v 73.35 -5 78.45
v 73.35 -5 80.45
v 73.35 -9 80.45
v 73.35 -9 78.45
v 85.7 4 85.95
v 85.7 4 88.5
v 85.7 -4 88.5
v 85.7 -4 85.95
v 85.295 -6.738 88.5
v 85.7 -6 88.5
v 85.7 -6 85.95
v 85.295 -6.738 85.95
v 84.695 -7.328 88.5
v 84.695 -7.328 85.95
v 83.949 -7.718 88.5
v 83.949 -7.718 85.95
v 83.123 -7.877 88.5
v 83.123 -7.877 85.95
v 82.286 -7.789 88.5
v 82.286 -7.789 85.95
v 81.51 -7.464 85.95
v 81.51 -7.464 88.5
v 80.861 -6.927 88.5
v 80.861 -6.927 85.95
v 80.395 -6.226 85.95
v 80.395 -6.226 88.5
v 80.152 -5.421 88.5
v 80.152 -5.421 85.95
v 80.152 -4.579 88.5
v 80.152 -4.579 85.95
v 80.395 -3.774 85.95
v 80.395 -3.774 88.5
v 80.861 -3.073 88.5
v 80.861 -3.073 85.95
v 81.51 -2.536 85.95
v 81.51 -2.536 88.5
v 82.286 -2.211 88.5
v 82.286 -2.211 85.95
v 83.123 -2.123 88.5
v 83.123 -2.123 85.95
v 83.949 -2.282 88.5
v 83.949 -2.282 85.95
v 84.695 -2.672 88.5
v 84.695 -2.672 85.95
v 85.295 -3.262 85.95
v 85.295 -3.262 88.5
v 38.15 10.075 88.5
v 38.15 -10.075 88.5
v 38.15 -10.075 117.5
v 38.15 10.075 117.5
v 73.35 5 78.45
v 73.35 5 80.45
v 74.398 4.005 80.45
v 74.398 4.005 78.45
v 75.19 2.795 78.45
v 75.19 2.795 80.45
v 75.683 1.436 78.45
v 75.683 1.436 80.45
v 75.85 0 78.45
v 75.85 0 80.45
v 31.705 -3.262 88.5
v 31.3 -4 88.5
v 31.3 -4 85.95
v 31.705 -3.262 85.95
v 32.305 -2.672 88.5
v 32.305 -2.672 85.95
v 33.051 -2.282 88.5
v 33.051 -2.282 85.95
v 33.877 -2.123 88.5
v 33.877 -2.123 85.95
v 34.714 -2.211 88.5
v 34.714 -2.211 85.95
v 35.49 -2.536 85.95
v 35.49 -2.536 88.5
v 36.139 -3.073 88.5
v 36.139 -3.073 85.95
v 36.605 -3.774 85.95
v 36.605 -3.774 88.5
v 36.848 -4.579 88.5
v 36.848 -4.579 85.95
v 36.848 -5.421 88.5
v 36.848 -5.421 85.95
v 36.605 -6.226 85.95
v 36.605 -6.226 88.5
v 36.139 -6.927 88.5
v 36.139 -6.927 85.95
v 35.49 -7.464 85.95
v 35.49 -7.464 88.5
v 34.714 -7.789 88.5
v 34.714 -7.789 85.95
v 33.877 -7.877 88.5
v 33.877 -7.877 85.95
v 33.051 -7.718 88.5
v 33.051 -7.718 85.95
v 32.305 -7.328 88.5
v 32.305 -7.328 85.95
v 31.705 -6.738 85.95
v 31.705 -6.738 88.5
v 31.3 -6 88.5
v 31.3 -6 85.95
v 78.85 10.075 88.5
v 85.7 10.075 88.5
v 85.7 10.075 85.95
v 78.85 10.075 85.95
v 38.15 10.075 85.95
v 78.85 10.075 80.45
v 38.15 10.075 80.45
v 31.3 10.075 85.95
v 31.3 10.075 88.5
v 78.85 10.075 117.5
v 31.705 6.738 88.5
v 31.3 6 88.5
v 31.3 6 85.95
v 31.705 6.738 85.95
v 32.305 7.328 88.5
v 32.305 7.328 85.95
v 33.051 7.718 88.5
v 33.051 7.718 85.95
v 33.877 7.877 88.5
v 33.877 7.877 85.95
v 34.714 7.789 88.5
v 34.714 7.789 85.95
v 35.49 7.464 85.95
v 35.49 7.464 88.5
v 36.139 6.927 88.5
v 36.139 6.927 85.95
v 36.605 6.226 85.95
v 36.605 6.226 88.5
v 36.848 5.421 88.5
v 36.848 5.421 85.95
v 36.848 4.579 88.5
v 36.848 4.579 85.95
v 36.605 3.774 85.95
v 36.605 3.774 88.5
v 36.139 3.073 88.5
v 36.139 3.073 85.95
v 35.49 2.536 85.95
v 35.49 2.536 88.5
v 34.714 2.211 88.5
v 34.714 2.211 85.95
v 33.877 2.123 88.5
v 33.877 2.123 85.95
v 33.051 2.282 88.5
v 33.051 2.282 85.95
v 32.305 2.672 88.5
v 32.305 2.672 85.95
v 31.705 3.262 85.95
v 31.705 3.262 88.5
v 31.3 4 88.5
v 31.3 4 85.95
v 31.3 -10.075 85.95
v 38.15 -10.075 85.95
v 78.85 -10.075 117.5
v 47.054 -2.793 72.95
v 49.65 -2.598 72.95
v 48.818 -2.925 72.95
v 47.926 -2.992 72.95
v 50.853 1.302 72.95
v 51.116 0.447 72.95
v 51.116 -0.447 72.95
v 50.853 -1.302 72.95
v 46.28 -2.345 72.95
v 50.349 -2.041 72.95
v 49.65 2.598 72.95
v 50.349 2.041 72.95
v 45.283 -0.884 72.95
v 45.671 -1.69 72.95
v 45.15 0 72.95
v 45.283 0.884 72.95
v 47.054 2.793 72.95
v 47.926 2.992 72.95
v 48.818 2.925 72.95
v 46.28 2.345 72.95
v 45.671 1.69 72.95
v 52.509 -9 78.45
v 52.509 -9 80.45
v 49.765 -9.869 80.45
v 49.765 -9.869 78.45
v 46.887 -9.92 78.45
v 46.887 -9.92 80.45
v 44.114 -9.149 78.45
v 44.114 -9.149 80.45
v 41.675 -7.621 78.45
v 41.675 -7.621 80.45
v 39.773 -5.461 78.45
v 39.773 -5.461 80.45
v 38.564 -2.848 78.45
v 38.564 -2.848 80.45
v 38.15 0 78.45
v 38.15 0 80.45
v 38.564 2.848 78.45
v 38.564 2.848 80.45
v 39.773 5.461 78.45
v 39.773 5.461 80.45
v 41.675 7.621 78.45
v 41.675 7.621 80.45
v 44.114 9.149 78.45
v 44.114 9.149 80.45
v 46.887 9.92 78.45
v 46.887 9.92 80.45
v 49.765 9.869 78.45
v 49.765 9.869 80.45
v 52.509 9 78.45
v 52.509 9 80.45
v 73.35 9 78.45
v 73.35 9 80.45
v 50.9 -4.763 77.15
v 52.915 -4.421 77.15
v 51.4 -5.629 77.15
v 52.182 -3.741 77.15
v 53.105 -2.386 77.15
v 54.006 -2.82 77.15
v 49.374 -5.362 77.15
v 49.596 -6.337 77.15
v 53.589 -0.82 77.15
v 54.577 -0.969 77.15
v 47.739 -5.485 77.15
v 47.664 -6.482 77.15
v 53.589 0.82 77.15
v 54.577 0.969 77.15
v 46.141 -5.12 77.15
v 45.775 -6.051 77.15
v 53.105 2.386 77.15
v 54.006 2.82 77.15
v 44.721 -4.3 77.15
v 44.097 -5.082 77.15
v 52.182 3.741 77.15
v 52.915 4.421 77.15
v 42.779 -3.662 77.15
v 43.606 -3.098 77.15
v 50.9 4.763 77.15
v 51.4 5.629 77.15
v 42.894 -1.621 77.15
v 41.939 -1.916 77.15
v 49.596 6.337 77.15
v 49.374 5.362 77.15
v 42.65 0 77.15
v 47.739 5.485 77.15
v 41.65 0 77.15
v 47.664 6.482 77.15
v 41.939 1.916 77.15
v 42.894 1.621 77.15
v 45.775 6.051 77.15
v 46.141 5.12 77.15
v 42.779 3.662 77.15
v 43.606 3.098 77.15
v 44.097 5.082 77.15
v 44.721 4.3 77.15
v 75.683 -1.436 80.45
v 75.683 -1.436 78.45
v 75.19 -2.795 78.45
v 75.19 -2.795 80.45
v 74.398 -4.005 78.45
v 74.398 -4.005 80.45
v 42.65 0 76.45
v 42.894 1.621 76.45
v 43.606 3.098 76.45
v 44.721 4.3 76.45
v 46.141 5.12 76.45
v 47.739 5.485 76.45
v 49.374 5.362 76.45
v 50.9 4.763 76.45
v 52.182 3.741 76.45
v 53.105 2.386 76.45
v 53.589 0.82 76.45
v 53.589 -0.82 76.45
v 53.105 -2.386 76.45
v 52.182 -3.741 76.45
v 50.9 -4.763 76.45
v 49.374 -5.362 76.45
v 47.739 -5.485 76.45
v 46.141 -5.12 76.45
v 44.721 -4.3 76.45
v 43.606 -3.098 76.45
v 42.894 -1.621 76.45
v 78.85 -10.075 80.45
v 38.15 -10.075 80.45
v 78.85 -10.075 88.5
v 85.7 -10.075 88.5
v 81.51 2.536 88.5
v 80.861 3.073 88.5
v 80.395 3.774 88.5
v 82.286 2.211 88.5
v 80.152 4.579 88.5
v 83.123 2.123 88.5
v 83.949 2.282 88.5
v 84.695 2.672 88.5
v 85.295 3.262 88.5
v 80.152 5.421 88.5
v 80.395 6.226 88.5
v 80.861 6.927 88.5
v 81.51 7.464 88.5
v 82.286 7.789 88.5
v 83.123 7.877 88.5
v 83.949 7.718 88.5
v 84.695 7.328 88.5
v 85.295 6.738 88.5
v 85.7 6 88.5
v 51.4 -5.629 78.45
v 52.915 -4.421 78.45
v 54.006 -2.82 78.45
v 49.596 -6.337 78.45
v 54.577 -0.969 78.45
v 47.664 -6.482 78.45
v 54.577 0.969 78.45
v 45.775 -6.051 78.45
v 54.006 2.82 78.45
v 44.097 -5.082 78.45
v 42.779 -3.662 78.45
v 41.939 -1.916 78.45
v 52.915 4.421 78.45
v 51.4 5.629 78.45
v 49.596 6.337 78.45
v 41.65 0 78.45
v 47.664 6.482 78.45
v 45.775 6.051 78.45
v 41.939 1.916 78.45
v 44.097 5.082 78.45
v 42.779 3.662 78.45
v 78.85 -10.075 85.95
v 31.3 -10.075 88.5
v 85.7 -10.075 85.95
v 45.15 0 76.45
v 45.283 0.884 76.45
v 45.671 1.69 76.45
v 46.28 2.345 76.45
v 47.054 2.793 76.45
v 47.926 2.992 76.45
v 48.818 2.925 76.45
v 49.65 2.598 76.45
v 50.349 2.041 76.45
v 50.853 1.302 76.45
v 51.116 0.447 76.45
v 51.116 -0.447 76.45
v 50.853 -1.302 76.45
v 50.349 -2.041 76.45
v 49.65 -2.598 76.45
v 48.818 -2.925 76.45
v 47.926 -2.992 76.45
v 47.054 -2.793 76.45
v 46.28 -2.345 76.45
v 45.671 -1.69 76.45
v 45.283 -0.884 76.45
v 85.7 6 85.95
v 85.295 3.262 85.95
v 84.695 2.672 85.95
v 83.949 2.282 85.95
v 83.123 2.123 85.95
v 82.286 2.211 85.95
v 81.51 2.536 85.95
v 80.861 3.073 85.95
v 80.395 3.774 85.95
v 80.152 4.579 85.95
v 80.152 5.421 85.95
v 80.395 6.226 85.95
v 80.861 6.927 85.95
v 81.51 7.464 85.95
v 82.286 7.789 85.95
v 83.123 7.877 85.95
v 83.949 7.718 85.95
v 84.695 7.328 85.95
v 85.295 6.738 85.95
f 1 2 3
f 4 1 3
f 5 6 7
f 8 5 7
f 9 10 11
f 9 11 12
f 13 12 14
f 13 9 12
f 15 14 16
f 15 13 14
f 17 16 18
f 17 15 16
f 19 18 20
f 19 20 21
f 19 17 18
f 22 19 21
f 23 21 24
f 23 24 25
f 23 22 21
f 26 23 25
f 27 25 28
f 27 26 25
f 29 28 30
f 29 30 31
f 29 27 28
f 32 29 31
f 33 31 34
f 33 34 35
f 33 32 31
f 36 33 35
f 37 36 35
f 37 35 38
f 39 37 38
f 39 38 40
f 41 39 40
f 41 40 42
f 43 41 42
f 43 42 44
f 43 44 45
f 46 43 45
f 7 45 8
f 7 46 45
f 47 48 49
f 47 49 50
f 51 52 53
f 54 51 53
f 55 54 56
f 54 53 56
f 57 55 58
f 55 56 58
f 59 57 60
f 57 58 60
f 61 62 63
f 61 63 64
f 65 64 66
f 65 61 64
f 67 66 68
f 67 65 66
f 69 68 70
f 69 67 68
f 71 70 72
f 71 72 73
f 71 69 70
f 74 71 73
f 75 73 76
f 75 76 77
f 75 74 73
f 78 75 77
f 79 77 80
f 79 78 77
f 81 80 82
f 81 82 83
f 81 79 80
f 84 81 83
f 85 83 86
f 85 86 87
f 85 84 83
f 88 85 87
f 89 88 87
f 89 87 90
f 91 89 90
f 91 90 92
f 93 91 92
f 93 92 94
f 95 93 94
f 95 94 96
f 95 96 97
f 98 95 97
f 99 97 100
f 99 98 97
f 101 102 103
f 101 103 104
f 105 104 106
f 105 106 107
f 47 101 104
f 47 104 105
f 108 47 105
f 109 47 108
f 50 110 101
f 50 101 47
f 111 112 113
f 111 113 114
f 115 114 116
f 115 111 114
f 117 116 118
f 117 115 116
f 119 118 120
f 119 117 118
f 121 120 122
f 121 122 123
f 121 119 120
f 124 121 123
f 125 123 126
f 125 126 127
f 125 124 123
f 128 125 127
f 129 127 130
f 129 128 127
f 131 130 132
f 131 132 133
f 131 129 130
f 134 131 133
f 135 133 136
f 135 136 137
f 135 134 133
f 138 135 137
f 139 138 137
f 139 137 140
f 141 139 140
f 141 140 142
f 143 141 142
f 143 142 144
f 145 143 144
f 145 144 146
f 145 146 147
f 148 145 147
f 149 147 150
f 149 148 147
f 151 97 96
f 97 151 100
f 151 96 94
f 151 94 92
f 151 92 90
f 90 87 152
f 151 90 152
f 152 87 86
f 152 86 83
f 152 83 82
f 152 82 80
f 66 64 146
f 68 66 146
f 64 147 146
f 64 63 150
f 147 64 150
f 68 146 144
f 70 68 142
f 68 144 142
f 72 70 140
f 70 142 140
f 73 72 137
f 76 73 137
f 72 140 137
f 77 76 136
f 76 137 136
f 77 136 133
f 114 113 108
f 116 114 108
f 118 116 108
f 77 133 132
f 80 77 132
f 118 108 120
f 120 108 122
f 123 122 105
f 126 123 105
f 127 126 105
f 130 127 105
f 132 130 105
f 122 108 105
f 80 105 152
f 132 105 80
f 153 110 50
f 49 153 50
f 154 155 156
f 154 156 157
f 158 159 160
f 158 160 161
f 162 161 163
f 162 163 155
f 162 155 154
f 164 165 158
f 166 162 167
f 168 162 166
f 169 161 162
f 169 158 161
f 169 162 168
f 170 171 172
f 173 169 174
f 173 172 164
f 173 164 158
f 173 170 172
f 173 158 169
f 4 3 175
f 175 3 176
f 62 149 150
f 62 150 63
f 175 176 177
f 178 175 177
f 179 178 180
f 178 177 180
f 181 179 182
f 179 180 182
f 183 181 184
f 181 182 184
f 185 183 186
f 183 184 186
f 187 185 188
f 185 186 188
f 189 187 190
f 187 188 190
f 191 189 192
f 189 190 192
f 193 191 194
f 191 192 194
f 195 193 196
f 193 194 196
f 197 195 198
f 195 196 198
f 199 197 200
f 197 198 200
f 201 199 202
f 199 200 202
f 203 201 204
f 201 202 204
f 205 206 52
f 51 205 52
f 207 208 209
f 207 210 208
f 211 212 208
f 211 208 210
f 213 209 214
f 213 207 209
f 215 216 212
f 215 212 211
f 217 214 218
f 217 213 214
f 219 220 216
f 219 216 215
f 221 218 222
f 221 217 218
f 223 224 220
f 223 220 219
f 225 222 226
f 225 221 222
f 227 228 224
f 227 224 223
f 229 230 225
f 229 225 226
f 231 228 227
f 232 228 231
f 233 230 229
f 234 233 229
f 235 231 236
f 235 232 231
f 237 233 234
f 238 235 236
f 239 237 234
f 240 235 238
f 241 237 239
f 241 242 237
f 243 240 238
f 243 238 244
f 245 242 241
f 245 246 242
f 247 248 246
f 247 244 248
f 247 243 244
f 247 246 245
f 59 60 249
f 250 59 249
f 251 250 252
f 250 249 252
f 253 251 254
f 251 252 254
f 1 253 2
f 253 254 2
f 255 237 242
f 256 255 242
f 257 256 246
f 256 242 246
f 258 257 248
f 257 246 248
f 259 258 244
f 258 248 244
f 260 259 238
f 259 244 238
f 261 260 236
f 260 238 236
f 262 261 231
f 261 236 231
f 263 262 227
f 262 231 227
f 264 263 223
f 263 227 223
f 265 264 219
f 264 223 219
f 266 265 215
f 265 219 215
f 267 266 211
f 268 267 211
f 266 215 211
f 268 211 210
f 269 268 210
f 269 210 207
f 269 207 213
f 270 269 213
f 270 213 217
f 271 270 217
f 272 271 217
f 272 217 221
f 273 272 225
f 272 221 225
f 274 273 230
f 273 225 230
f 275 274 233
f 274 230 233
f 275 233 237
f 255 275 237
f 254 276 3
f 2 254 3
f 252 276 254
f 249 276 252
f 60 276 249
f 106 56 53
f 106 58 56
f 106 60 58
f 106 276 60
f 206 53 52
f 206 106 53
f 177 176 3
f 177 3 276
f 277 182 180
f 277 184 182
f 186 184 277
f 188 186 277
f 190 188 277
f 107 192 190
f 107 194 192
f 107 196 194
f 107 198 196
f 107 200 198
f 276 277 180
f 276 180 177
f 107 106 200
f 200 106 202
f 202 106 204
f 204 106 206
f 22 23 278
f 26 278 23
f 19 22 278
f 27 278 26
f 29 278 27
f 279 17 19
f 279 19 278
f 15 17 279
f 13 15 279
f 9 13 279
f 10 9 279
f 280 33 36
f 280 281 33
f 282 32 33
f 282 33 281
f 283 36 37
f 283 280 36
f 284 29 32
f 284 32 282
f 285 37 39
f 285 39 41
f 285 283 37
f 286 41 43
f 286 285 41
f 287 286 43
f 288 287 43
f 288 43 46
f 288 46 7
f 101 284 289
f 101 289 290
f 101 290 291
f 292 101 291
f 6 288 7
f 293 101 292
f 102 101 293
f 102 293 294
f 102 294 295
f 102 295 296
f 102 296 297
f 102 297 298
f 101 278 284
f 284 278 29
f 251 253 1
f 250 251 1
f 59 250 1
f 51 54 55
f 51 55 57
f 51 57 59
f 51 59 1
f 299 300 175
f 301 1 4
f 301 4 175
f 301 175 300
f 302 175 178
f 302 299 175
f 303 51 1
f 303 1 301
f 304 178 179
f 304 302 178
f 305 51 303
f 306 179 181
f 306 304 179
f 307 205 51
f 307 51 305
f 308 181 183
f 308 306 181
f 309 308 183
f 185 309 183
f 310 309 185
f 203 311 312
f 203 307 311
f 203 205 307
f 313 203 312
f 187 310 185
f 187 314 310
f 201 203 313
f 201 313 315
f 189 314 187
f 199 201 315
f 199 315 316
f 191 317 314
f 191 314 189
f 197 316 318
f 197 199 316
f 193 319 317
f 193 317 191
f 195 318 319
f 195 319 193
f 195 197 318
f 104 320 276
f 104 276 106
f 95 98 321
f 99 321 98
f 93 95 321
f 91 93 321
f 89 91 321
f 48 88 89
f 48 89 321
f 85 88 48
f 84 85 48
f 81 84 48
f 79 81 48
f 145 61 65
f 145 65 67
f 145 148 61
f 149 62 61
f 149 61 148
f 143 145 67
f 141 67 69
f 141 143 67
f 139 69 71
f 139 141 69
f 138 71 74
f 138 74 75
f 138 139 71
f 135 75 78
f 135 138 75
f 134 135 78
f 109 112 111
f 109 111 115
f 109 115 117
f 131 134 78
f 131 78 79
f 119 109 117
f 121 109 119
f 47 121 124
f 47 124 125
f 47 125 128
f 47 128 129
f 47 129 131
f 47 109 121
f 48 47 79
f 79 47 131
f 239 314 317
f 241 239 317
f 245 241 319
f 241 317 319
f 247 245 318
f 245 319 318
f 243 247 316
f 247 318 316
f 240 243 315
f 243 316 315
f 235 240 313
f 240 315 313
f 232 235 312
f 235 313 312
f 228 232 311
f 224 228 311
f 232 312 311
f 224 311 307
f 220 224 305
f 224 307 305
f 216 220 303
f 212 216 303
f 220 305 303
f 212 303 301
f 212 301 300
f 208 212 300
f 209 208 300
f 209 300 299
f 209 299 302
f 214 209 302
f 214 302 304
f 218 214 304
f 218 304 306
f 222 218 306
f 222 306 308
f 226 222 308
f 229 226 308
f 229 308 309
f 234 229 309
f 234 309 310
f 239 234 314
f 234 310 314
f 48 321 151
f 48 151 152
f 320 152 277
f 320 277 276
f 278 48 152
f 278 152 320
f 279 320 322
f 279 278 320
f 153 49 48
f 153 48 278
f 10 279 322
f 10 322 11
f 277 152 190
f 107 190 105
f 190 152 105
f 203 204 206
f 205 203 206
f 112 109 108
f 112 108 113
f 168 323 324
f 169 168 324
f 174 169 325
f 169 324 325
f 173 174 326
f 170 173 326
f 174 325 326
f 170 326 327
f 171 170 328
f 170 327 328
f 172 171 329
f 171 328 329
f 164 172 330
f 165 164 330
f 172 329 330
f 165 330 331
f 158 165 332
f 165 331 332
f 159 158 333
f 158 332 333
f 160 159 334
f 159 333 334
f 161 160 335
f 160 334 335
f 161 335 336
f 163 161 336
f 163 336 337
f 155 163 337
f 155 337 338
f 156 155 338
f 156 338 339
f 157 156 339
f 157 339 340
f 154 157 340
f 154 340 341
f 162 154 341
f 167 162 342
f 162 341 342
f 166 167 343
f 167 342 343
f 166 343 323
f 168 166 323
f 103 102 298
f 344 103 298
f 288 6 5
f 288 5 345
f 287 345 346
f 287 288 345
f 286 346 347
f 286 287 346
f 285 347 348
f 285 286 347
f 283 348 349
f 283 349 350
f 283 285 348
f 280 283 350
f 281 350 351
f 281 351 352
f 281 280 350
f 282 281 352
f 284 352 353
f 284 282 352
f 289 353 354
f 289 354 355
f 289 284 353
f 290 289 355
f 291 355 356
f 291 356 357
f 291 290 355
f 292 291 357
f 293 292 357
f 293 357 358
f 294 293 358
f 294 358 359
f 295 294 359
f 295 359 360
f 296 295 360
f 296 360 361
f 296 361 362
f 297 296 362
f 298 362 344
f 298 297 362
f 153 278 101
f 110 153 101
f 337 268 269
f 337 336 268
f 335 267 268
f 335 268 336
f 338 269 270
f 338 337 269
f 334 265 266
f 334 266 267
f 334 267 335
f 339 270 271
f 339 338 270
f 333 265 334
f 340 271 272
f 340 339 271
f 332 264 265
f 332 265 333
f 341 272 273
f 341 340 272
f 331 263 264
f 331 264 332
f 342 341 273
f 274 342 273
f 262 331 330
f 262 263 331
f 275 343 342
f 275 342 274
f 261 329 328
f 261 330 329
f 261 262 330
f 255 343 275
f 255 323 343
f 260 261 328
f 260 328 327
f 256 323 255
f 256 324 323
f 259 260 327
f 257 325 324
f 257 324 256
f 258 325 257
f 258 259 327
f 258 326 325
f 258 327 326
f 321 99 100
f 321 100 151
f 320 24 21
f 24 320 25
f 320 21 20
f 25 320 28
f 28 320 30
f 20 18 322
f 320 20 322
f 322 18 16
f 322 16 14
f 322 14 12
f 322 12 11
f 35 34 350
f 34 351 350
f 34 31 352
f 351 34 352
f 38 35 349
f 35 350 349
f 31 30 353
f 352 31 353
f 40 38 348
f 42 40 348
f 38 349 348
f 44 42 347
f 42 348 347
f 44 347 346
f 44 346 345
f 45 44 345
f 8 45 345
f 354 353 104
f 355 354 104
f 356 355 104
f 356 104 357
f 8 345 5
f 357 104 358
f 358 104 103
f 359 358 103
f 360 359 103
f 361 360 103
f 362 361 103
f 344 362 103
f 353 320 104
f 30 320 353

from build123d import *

# Parameters (mm, degrees)
SKETCH040_W             = 40.7
SKETCH040_H             = 20.15
PAD020_DEPTH            = 29
PAD021_DEPTH            = 2.55
SKETCH042_W             = 40.7
SKETCH042_H             = 20.15
PAD022_DEPTH            = 5.5
PAD023_DEPTH            = 2
SKETCH044_R             = 6.5
PAD024_DEPTH            = 1.3
SKETCH045_R             = 5.5
PAD025_DEPTH            = 0.7
SKETCH046_R             = 3
PAD026_DEPTH            = 3.5
BODY013_PLACEMENT_ANGLE = 180
BODY046_PLACEMENT_ANGLE = 180


with BuildPart() as part:
    # Sketch040 → Pad020 (new body)
    with BuildSketch(Plane.XY):
        Rectangle(SKETCH040_W, SKETCH040_H)
    extrude(amount=-PAD020_DEPTH)

    # Sketch041 (on Face5 of Pad020) → Pad021 (join)
    with BuildSketch(Plane.XY):
        with BuildLine():
            Line((-27.2, 10.075), (27.2, 10.075))
            Line((27.2, 10.075), (27.2, 6))
            ThreePointArc((27.2, 6), (21.620764, 5), (27.2, 4))
            Line((27.2, 4), (27.2, -4))
            ThreePointArc((27.2, -4), (21.620764, -5), (27.2, -6))
            Line((27.2, -6), (27.2, -10.075))
            Line((27.2, -10.075), (-27.2, -10.075))
            Line((-27.2, -10.075), (-27.2, -6))
            ThreePointArc((-27.2, -6), (-21.620764, -5), (-27.2, -4))
            Line((-27.2, 4), (-27.2, -4))
            ThreePointArc((-27.2, 4), (-21.620764, 5), (-27.2, 6))
            Line((-27.2, 10.075), (-27.2, 6))
        make_face()
    extrude(amount=PAD021_DEPTH)

    # Sketch042 (on Face5 of Pad021) → Pad022 (join)
    with BuildSketch(Plane.XY.offset(2.55)):
        Rectangle(SKETCH042_W, SKETCH042_H)
    extrude(amount=PAD022_DEPTH)

    # Sketch043 (on Face21 of Pad022) → Pad023 (join)
    with BuildSketch(Plane.XY.offset(8.05)):
        with BuildLine():
            ThreePointArc((5.991101, -9), (20.35, 0), (5.991101, 9))
            Line((5.991101, 9), (-14.85, 9))
            Line((-14.85, 9), (-14.85, 5))
            ThreePointArc((-14.85, 5), (-16.69017, 2.795085), (-17.35, 0))
            ThreePointArc((-17.35, 0), (-16.69017, -2.795085), (-14.85, -5))
            Line((-14.85, -5), (-14.85, -9))
            Line((-14.85, -9), (5.991101, -9))
        make_face()
    extrude(amount=PAD023_DEPTH)

    # Sketch044 (on Face34 of Pad023) → Pad024 (join)
    with BuildSketch(Plane.XY.offset(10.05)):
        with Locations((10.35, 0)):
            Circle(SKETCH044_R)
    extrude(amount=PAD024_DEPTH)

    # Sketch045 (on Face36 of Pad024) → Pad025 (join)
    with BuildSketch(Plane.XY.offset(11.35)):
        with Locations((10.35, 0)):
            Circle(SKETCH045_R)
    extrude(amount=PAD025_DEPTH)

    # Sketch046 (on Face38 of Pad025) → Pad026 (join)
    with BuildSketch(Plane.XY.offset(12.05)):
        with Locations((10.35, 0)):
            Circle(SKETCH046_R)
    extrude(amount=PAD026_DEPTH)


with BuildPart() as part_1:
    # Body013 placement: moved
    add(part.part.moved(Location((-58.5, 0, 88.5))).rotate(Axis((-58.5, 0, 88.5), (1, 0, 0)), BODY013_PLACEMENT_ANGLE))


with BuildPart() as part_2:
    # Body046 placement: moved
    add(part_1.part.rotate(Axis((0, 0, 0), (0, 0, 1)), BODY046_PLACEMENT_ANGLE))


solid = part_2.part
